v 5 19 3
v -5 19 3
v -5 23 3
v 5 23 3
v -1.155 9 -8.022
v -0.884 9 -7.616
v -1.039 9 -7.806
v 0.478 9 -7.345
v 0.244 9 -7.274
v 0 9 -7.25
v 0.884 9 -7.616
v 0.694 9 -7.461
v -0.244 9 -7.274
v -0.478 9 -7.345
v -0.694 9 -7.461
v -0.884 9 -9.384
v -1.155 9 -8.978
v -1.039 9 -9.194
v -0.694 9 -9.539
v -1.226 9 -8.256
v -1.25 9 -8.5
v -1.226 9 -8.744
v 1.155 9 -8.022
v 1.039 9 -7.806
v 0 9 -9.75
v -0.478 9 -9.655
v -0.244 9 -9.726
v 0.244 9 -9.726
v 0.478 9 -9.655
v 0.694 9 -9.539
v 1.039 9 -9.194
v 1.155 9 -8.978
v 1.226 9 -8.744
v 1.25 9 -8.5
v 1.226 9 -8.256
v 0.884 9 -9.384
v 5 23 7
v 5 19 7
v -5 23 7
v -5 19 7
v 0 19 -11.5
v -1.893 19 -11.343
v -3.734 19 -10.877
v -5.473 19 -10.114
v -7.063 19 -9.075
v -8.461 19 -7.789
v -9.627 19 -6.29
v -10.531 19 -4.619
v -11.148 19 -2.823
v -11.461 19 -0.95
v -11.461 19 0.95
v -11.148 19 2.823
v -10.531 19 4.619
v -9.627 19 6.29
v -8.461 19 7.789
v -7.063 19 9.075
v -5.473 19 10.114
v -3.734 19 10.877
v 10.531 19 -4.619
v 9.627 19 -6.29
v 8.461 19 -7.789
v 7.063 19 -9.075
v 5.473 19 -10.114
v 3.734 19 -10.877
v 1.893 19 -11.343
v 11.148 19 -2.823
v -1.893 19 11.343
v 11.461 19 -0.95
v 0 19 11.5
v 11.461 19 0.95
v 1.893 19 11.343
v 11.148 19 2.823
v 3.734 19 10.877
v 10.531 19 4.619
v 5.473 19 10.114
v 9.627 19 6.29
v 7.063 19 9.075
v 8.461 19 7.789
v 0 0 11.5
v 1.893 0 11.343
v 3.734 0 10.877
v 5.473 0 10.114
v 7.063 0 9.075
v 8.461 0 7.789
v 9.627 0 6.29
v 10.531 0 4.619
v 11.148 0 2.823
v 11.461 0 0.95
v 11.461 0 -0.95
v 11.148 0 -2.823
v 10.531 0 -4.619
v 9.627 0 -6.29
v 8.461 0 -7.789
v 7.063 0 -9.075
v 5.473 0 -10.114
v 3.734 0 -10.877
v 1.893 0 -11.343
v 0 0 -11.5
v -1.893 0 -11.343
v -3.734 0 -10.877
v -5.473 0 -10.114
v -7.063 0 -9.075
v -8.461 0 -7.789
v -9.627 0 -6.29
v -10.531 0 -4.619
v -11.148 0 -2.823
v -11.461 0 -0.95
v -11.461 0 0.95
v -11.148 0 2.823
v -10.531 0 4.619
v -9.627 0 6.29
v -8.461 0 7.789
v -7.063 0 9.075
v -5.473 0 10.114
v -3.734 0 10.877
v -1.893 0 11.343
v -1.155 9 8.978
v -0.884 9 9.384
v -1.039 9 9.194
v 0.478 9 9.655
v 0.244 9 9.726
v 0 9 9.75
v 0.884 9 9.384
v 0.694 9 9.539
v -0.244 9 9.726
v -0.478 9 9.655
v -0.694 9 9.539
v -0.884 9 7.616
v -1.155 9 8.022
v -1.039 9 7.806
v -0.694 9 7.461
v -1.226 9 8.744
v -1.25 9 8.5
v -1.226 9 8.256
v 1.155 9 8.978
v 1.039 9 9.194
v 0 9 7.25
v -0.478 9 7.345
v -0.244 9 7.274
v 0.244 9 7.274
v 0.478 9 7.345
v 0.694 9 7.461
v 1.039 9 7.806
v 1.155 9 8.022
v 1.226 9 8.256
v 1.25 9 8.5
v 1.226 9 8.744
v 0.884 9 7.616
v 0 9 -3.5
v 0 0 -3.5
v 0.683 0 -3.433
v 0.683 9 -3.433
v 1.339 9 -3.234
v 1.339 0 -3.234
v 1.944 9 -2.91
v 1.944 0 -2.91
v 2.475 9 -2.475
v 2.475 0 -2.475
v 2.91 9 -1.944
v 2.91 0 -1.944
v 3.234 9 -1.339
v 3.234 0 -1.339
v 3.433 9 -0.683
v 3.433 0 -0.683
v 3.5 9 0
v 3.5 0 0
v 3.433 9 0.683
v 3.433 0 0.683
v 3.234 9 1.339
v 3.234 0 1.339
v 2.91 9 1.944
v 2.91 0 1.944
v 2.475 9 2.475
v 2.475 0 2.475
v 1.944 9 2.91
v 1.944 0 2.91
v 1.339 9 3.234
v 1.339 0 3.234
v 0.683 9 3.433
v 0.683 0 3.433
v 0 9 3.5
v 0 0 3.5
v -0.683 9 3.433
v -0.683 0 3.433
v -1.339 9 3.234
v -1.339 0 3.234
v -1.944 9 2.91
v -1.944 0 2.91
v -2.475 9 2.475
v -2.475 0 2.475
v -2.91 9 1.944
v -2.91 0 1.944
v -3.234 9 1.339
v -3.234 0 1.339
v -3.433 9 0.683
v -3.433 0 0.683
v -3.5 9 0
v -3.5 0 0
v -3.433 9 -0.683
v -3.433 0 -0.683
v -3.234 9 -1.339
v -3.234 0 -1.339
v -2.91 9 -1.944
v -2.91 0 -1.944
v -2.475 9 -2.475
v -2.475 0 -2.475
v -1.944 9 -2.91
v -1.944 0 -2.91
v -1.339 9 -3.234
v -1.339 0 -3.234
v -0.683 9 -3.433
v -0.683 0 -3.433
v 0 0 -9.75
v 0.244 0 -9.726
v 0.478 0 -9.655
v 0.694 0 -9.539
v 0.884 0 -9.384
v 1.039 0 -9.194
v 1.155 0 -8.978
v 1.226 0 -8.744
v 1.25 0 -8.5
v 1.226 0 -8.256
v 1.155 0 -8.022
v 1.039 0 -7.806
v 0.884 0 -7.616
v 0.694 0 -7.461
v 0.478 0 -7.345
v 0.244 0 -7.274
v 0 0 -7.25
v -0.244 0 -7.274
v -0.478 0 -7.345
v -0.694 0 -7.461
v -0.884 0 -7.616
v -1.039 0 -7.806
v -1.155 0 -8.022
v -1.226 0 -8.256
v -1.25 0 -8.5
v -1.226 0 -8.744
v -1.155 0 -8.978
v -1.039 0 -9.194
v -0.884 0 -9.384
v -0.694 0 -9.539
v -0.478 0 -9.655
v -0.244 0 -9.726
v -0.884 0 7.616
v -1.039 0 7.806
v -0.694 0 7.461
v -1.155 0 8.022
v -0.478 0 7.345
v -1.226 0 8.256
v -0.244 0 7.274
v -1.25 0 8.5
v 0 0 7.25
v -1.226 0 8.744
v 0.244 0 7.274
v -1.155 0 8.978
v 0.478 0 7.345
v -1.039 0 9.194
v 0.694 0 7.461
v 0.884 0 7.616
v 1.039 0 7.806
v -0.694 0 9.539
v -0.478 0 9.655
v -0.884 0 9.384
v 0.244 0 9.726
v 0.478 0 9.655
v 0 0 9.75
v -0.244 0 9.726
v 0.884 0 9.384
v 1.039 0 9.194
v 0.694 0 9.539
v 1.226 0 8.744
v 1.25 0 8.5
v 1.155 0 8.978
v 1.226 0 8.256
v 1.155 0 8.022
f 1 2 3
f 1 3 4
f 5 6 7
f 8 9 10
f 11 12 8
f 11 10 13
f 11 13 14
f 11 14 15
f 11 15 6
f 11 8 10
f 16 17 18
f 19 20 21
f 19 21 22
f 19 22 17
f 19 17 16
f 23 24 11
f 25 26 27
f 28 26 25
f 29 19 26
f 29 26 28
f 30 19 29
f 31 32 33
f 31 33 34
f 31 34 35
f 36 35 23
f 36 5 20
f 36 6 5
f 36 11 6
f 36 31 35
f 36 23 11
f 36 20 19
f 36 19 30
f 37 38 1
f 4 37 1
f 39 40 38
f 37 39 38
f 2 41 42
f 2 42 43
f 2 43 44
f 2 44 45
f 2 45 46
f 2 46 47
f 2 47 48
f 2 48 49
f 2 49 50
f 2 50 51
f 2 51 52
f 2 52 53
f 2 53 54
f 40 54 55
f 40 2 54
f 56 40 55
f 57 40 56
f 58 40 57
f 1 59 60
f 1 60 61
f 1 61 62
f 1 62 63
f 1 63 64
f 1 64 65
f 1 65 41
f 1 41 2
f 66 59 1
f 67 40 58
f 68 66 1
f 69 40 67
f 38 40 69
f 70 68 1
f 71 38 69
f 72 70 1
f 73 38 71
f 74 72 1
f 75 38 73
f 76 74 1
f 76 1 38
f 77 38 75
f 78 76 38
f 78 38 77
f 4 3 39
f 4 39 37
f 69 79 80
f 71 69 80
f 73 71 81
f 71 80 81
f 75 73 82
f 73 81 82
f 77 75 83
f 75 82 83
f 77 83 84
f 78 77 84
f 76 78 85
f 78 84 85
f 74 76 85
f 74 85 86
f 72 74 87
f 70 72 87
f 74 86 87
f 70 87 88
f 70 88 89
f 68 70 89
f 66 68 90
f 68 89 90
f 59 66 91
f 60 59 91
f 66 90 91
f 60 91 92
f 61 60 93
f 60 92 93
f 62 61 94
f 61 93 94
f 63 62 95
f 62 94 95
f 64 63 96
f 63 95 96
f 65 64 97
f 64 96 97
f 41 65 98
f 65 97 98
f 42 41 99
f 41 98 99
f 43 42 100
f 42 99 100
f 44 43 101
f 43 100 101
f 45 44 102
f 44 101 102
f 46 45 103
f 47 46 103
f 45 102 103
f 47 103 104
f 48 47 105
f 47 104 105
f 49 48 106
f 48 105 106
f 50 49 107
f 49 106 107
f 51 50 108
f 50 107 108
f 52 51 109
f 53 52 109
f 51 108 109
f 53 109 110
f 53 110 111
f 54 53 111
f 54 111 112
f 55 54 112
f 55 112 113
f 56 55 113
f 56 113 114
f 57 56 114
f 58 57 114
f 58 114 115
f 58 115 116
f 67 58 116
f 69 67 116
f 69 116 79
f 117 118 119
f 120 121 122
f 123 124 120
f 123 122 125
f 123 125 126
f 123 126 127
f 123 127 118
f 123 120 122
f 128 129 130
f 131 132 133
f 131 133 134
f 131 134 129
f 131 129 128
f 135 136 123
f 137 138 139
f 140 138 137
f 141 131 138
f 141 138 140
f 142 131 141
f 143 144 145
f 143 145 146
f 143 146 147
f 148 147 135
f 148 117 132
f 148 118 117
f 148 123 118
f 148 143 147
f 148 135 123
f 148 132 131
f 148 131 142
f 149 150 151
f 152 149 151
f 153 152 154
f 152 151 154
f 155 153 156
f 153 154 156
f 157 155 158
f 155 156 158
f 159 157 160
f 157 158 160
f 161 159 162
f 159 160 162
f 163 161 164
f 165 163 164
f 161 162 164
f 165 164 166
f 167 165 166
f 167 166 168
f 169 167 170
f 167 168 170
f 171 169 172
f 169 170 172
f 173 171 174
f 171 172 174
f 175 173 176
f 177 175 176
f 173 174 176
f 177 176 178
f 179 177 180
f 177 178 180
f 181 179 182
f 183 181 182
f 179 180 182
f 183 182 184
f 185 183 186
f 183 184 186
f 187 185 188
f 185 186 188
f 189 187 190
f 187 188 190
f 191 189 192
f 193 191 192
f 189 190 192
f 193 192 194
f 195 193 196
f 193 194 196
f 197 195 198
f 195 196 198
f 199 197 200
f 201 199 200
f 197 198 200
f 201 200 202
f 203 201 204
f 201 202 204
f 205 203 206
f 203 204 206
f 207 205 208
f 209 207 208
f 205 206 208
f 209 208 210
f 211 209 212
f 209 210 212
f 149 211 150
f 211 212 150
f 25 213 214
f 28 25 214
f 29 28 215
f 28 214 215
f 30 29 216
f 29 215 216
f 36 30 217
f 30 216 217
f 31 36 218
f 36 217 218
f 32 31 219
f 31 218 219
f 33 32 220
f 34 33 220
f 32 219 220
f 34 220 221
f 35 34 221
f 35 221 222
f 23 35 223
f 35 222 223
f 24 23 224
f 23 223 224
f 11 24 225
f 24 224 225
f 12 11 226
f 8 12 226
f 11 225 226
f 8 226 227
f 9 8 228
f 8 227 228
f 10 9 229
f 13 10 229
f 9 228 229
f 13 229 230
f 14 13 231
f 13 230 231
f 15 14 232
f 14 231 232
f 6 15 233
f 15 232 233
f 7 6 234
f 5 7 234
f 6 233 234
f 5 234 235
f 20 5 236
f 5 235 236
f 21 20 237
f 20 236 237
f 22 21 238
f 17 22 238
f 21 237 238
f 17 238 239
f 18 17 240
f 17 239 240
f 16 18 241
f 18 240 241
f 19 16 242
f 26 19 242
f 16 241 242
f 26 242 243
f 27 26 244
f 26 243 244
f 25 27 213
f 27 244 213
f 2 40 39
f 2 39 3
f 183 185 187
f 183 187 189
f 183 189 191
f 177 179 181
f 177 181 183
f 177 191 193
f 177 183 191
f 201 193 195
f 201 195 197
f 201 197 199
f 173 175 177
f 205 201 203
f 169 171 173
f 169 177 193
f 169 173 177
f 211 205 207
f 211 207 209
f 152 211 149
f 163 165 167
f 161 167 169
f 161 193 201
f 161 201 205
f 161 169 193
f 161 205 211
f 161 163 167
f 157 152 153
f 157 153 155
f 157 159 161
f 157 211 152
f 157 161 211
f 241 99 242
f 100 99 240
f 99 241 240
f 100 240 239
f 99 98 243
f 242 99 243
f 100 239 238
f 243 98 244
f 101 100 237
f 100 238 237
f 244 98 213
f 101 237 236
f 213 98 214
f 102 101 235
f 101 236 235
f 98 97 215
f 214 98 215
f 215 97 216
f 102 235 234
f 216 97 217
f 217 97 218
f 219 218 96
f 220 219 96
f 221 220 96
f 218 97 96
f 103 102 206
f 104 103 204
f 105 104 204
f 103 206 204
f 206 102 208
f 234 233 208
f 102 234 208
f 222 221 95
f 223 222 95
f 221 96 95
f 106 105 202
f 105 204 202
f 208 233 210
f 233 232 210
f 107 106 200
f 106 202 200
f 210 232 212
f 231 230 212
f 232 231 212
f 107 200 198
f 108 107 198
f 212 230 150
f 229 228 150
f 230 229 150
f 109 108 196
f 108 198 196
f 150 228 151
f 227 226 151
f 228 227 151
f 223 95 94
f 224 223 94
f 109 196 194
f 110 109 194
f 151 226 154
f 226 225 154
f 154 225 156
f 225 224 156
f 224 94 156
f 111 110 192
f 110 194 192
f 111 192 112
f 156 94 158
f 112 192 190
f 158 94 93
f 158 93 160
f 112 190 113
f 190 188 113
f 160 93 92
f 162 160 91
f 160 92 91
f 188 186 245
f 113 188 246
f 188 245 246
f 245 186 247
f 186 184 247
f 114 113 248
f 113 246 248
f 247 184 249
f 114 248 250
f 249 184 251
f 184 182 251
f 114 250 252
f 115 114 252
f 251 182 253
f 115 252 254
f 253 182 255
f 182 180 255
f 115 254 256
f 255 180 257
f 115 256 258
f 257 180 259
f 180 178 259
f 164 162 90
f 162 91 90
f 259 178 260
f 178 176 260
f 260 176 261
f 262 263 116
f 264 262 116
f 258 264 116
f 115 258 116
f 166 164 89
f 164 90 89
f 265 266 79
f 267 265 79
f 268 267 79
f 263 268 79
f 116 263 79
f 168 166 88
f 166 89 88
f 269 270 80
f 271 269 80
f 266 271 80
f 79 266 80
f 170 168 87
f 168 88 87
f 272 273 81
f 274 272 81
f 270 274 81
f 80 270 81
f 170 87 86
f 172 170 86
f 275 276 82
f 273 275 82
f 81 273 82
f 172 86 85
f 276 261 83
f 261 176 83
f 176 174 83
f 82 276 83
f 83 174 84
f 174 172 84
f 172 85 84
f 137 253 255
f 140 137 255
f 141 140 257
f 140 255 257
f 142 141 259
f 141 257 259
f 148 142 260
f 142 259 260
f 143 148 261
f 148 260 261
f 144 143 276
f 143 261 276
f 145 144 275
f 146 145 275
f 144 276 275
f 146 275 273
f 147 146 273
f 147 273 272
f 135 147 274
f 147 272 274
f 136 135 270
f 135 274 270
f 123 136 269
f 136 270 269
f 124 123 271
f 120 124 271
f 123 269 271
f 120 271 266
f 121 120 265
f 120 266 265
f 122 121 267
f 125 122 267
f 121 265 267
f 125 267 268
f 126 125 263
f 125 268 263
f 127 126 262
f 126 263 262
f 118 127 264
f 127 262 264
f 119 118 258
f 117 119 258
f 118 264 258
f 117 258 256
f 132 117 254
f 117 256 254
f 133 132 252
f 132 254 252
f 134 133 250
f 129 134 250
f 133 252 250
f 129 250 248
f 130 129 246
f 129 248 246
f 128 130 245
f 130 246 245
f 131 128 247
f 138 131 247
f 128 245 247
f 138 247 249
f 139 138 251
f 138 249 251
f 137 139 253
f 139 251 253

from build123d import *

# Parameters (mm, degrees)
SKETCH1_R           = 11.5
BOSS_EXTRUDE1_DEPTH = 19
SKETCH2_W           = 10
SKETCH2_H           = 4
BOSS_EXTRUDE2_DEPTH = 4
SKETCH3_R           = 3.5
SKETCH3_R_2         = 1.25
CUT_EXTRUDE1_DEPTH  = 9


with BuildPart() as part:
    # Sketch1 → Boss-Extrude1 (new body)
    with BuildSketch(Plane(origin=(0, 0, 0), x_dir=(1, 0, 0), z_dir=(0, 1, 0))):
        with Locations(Location((0, 0, 0), (0, 0, 270))):
            Circle(SKETCH1_R)
    extrude(amount=BOSS_EXTRUDE1_DEPTH)

    # Sketch2 → Boss-Extrude2 (add)
    with BuildSketch(Plane(origin=(0, 19, 0), x_dir=(1, 0, 0), z_dir=(0, 1, 0))):
        with Locations((0, -5)):
            Rectangle(SKETCH2_W, SKETCH2_H)
    extrude(amount=BOSS_EXTRUDE2_DEPTH)

    # Sketch3 → Cut-Extrude1 (cut)
    with BuildSketch(Plane.XZ):
        with Locations(Location((0, 0, 0), (0, 0, 270))):
            Circle(SKETCH3_R)
        with Locations(Location((0, 8.5, 0), (0, 0, 270))):
            Circle(SKETCH3_R_2)
        with Locations(Location((0, -8.5, 0), (0, 0, 270))):
            Circle(SKETCH3_R_2)
    extrude(amount=-CUT_EXTRUDE1_DEPTH, mode=Mode.SUBTRACT)


solid = part.part
